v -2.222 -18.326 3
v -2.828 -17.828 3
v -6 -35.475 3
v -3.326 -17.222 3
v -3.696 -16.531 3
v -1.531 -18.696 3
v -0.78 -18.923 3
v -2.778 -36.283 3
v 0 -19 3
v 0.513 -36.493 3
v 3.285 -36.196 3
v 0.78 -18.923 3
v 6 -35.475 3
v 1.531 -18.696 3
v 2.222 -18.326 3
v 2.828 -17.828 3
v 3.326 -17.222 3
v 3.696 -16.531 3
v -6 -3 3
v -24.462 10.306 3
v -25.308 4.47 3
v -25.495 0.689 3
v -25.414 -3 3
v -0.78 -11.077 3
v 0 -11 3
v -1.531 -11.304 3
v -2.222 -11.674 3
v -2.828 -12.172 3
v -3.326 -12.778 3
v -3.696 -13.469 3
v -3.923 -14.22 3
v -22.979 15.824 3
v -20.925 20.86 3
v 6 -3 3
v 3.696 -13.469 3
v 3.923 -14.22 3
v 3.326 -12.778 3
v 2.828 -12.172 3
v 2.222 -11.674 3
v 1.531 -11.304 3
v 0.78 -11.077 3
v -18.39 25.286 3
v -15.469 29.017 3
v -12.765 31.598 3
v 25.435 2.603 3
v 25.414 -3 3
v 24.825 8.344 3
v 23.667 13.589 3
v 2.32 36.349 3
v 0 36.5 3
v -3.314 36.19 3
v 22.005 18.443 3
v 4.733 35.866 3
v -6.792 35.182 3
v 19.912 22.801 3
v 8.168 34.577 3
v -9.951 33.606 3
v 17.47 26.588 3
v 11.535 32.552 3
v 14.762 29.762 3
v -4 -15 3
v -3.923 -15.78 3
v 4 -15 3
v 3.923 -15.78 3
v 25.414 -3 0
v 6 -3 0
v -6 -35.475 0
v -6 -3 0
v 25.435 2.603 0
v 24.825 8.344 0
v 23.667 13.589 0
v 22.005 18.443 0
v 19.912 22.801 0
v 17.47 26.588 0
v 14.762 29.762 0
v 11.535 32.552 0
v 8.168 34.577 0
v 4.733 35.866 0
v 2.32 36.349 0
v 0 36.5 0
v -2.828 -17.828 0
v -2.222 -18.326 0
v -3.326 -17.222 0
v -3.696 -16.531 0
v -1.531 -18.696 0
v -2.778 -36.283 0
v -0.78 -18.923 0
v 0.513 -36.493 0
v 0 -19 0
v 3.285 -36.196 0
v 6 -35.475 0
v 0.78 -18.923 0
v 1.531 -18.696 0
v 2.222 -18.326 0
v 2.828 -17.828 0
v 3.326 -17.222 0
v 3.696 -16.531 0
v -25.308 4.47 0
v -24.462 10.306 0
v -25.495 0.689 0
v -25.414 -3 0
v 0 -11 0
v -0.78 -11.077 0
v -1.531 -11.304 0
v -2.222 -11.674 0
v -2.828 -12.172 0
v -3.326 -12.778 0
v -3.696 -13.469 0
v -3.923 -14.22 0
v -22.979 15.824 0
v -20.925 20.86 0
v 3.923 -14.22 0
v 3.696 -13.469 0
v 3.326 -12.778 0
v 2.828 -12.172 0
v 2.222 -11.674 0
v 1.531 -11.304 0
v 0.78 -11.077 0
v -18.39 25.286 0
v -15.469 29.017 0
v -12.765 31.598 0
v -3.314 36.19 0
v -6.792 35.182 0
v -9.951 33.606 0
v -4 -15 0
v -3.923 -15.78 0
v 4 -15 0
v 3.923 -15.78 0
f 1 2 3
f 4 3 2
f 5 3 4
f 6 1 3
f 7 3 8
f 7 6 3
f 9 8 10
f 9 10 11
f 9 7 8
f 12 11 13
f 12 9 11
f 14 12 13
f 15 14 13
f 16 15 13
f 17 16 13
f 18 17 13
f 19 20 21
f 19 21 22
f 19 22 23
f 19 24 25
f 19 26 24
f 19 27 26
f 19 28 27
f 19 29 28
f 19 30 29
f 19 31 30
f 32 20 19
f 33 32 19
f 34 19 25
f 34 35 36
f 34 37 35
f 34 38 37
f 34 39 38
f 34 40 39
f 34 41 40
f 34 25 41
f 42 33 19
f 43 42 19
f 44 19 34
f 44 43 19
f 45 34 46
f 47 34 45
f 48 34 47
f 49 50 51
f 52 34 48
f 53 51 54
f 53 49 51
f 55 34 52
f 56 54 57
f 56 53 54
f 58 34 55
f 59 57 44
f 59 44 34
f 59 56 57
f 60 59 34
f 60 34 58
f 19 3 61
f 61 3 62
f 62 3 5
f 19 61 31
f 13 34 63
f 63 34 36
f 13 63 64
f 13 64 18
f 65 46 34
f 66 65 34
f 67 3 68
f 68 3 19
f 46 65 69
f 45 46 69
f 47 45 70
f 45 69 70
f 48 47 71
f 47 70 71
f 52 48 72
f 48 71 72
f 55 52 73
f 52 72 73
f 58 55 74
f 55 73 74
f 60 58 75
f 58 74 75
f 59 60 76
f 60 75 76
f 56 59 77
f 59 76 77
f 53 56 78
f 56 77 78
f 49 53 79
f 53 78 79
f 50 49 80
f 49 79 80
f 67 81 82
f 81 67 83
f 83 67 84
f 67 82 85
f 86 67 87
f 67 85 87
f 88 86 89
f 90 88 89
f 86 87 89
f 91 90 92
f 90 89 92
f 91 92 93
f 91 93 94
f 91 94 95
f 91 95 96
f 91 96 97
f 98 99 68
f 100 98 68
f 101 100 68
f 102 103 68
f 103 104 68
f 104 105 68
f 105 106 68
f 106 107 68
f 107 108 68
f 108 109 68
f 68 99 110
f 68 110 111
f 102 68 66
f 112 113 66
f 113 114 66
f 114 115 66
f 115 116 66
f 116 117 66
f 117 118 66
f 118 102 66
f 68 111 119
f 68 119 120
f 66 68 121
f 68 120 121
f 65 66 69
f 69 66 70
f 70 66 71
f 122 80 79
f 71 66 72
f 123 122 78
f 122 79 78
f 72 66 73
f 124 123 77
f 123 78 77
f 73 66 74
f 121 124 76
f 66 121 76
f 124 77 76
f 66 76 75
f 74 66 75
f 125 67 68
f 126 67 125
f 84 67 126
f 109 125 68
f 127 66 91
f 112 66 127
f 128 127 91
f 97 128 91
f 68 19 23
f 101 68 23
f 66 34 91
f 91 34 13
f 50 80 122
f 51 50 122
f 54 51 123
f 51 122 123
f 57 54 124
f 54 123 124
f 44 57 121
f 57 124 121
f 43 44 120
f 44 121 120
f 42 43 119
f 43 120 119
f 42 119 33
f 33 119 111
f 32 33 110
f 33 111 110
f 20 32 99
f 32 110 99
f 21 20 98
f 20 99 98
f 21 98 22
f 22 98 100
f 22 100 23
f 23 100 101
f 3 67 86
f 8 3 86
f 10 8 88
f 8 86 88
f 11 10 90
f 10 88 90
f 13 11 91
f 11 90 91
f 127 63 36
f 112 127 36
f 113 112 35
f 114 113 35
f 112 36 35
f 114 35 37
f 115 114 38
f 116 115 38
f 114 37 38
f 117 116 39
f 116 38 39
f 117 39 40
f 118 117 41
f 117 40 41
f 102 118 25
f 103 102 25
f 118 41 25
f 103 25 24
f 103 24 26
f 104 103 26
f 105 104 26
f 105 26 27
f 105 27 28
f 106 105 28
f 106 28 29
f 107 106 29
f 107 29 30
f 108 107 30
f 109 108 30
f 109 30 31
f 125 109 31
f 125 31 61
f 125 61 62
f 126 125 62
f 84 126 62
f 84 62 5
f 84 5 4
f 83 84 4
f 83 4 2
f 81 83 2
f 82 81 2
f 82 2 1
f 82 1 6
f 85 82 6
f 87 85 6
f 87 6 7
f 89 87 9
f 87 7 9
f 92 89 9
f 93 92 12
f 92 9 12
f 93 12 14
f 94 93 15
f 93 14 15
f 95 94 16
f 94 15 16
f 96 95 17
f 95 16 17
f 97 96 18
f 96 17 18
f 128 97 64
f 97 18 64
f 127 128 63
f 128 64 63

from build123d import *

# Parameters (mm, degrees)
F1_DEPTH = 3
F4_DEPTH = 25
F2_R     = 4
F5_DEPTH = 25


with BuildPart() as f1:
    # F0 (on Top) → F1 (new body)
    with BuildSketch(Plane.XY):
        with BuildLine():
            add(Edge.make_bspline(
                [(0, 36.5), (-44.167296, 36.5), (-22.083648, -18.25), (0, -73), (22.083648, -18.25), (44.167296, 36.5), (0, 36.5)],
                knots=[0, 0, 0, 2.094395, 2.094395, 4.18879, 4.18879, 6.283185, 6.283185, 6.283185], degree=2, weights=[1, 0.5, 1, 0.5, 1, 0.5, 1]))
        make_face()
    extrude(amount=F1_DEPTH)

    # F3 (on face) → F4 (cut)
    with BuildSketch(Plane.XY.offset(3)):
        with BuildLine():
            Line((-6, -35.475234), (-6, -3))
            Line((-6, -3), (-25.413722, -3))
            add(Edge.make_bspline(
                [(-25.413722, -3), (-24.943593, -11.159594), (-22.083648, -18.25), (-16.620171, -31.795106), (-6, -35.475234)],
                knots=[1.614123, 1.614123, 1.614123, 2.094395, 2.094395, 2.925166, 2.925166, 2.925166], degree=2, weights=[0.823271, 0.885343, 1, 0.801668, 0.760678]))
        make_face()
        with BuildLine():
            Line((6, -3), (6, -35.475234))
            add(Edge.make_bspline(
                [(6, -35.475234), (16.620171, -31.795106), (22.083648, -18.25), (24.943593, -11.159594), (25.413722, -3)],
                knots=[3.358019, 3.358019, 3.358019, 4.18879, 4.18879, 4.669062, 4.669062, 4.669062], degree=2, weights=[0.760678, 0.801668, 1, 0.885343, 0.823271]))
            Line((25.413722, -3), (6, -3))
        make_face()
    extrude(amount=-F4_DEPTH, mode=Mode.SUBTRACT)

    # F2 (on face) → F5 (cut)
    with BuildSketch(Plane.XY.offset(3)):
        with Locations((0, -15)):
            Circle(F2_R)
    extrude(amount=-F5_DEPTH, mode=Mode.SUBTRACT)


solid = f1.part
